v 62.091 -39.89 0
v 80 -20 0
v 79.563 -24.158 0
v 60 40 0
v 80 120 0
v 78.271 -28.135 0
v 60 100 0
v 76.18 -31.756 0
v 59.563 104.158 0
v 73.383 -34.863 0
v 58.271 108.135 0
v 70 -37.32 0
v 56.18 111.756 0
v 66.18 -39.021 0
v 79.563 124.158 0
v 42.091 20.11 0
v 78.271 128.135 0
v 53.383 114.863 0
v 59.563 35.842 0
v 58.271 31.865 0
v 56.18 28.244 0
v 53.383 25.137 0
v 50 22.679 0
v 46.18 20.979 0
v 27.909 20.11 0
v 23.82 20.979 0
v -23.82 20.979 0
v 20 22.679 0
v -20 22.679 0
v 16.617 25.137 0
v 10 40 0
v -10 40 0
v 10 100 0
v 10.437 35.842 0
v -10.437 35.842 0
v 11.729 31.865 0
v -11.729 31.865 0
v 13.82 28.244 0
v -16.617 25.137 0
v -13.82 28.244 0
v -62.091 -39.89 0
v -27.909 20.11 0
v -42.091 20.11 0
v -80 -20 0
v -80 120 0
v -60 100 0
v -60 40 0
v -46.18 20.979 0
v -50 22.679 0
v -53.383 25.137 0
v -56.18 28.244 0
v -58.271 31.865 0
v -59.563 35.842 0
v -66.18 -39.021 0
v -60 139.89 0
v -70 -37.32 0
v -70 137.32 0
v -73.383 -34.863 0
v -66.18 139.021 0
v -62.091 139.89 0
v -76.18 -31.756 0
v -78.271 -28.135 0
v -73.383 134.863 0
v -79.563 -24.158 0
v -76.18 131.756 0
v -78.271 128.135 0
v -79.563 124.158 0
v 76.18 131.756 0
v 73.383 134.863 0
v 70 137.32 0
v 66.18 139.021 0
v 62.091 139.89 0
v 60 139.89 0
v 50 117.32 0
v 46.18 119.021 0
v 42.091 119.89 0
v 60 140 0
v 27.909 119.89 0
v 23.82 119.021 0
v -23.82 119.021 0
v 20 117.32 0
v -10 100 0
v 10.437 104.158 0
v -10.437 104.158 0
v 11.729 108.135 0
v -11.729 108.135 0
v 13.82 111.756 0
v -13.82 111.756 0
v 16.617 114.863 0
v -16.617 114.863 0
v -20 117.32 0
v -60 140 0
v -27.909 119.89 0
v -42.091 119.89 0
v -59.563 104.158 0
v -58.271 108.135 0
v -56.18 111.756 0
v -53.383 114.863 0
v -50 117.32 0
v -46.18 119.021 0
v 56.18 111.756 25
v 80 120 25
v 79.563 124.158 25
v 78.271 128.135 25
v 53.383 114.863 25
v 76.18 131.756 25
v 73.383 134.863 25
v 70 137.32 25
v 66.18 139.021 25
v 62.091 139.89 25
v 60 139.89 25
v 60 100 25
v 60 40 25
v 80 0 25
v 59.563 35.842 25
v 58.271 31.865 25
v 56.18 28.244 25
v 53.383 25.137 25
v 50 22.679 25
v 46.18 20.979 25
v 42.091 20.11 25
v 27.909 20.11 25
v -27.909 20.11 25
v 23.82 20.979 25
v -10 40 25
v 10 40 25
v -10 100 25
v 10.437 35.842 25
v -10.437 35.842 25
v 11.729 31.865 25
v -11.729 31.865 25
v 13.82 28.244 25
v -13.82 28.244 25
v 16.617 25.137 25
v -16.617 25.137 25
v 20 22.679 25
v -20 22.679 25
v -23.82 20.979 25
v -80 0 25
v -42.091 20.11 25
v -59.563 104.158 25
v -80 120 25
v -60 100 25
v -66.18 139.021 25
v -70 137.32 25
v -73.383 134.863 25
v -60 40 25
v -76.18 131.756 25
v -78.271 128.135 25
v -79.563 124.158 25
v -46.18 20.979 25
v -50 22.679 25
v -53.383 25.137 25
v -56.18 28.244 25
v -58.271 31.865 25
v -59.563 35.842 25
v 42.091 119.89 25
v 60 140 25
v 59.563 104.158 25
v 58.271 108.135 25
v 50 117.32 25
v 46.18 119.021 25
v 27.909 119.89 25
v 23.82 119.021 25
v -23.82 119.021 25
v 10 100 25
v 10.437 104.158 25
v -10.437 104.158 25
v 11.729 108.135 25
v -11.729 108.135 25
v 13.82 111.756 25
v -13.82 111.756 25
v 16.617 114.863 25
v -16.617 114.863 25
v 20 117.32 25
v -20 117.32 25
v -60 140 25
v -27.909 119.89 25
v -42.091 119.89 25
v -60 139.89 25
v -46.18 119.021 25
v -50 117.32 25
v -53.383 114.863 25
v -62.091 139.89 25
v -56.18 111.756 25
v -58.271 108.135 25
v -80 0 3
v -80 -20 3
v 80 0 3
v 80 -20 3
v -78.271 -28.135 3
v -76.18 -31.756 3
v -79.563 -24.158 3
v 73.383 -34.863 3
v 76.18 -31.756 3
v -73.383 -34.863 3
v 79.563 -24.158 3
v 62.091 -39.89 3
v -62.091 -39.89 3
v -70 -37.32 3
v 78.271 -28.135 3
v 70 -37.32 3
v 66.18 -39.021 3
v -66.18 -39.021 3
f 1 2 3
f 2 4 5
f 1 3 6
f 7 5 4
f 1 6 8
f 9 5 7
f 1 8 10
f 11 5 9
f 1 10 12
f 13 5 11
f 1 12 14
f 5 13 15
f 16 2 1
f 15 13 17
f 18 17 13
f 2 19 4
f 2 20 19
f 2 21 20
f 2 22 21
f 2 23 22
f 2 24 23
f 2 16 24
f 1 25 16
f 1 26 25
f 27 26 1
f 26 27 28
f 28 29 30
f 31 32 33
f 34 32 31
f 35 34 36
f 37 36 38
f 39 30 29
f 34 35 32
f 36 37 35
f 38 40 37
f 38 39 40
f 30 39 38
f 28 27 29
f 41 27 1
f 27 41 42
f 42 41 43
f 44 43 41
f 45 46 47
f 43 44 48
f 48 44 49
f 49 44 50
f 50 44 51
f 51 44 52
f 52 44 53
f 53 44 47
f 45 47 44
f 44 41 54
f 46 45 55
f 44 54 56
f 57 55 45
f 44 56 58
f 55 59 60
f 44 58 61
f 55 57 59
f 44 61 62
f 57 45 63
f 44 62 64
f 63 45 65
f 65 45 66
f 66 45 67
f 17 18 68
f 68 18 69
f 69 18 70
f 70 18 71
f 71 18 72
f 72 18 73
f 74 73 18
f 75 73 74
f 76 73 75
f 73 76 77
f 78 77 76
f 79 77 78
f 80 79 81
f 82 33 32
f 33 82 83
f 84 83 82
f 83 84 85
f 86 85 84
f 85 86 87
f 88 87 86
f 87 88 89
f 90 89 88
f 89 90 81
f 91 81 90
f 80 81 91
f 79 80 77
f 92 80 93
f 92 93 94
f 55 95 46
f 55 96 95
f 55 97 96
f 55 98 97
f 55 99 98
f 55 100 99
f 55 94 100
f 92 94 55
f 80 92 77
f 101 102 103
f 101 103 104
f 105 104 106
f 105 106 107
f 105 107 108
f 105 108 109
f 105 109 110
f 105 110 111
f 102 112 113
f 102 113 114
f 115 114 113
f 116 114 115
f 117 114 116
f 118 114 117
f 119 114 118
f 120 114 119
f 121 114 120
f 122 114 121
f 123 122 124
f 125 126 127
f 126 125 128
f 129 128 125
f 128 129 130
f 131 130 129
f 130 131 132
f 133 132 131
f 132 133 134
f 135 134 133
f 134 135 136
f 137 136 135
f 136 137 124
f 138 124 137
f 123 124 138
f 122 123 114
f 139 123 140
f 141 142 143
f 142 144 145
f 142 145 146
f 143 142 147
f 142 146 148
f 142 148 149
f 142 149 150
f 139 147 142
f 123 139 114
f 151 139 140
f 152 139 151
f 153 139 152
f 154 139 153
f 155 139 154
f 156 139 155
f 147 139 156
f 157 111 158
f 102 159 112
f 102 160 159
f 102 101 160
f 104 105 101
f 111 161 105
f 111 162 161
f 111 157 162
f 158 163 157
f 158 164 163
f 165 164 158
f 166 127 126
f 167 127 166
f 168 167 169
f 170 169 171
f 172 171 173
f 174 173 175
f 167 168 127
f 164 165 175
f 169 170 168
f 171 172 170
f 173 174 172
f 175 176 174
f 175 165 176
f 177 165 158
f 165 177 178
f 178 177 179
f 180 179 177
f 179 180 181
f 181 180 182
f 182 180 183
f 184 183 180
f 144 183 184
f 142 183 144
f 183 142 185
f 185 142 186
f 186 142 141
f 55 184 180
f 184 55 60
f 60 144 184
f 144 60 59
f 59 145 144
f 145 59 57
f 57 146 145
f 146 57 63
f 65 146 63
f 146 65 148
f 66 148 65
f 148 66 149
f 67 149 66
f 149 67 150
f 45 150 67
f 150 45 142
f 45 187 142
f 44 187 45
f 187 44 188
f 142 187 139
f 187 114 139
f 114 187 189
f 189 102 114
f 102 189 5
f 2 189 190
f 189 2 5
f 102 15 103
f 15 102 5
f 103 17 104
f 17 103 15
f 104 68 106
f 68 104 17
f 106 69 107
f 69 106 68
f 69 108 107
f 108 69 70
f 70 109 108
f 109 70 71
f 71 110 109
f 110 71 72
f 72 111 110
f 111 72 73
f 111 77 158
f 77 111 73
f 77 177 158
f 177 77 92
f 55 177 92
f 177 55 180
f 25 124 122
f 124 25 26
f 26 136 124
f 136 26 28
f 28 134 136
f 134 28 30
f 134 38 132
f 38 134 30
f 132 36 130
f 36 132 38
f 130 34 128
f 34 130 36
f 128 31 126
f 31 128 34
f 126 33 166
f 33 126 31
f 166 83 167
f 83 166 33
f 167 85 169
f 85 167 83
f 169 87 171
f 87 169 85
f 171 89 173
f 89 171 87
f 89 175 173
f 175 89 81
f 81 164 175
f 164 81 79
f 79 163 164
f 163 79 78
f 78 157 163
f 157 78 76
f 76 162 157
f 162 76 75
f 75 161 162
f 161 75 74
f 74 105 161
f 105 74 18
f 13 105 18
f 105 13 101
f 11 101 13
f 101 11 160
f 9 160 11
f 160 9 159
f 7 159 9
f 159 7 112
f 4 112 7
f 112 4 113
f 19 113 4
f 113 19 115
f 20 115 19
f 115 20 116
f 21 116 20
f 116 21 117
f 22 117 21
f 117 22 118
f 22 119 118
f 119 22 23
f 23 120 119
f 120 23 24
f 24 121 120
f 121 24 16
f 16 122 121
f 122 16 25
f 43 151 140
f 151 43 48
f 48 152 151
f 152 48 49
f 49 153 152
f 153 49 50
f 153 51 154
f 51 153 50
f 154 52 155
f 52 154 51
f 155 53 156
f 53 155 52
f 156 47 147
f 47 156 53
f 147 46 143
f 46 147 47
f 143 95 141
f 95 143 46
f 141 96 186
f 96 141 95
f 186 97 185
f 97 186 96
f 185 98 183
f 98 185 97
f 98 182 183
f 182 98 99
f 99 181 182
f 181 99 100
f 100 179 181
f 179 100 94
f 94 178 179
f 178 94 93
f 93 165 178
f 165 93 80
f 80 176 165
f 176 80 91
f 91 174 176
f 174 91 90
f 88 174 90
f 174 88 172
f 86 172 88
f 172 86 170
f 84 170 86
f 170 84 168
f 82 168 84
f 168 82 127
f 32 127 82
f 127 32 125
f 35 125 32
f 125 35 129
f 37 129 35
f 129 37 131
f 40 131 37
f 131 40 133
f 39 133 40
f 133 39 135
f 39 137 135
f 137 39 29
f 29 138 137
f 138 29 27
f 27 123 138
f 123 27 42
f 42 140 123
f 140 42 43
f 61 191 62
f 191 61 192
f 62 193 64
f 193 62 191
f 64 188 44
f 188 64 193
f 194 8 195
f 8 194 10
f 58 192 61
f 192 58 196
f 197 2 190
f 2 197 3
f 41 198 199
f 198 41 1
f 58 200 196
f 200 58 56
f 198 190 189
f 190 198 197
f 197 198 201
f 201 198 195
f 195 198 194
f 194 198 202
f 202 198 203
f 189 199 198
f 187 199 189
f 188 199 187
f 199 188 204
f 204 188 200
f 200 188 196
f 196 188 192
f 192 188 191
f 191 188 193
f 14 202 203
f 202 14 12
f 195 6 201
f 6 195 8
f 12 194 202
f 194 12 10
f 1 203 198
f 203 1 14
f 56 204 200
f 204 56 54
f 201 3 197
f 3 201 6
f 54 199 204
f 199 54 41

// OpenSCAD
//                polygon([[0,0],[hb_r+2,0],[ph_half_width+gd_width,total_h-5],[ph_half_width+gd_width,total_h],[0,total_h]]);

w=160;
w_half = w/2;
h = 140;
thick = 20;
thick_half = thick/2;

module copy_mirror(vec=[0,1,0]) {
 union() {
  children();
  mirror(vec) children();
 }
};

linear_extrude(height=25, center=false)
{
    copy_mirror([1,0,0])
    difference(){
        union(){
            difference(){
                polygon([[0,0],[w_half,0],[w_half,h],[0,h]]);

                color(){
                    //translate([w_half-thick,0,0]) square(size=[thick,thick]);
                    translate([w_half-thick,h-thick,0]) square(size=[thick,thick]);
                }
            }

            color(){
                translate([w_half-thick,thick,0]) circle(d=thick*2);
                translate([w_half-thick,h-thick,0]) circle(d=thick*2);
            }
        }

        color()
        minkowski(){
            color() {translate([thick+thick_half,thick*2]) circle(r=thick);}
            color() {translate([0,0]) square(size=[w_half-thick*2-thick-thick_half,h-4*thick]);}
        }
    }
}

//color("red") translate([0,0,-1]) linear_extrude(height=6) translate([0,120/2+thick+1,0])square(size=[120,h-thick],center=true);

color()  
    linear_extrude(height=3) {
        hull(){
            translate([-w_half,-thick,0])
                square(size=[w,thick*2]);
            color(){
              translate([-w_half+thick,-thick,0])
                circle(r=thick);
             translate([w_half-thick,-thick,0])
                circle(r=thick);
            }
        }
    }
